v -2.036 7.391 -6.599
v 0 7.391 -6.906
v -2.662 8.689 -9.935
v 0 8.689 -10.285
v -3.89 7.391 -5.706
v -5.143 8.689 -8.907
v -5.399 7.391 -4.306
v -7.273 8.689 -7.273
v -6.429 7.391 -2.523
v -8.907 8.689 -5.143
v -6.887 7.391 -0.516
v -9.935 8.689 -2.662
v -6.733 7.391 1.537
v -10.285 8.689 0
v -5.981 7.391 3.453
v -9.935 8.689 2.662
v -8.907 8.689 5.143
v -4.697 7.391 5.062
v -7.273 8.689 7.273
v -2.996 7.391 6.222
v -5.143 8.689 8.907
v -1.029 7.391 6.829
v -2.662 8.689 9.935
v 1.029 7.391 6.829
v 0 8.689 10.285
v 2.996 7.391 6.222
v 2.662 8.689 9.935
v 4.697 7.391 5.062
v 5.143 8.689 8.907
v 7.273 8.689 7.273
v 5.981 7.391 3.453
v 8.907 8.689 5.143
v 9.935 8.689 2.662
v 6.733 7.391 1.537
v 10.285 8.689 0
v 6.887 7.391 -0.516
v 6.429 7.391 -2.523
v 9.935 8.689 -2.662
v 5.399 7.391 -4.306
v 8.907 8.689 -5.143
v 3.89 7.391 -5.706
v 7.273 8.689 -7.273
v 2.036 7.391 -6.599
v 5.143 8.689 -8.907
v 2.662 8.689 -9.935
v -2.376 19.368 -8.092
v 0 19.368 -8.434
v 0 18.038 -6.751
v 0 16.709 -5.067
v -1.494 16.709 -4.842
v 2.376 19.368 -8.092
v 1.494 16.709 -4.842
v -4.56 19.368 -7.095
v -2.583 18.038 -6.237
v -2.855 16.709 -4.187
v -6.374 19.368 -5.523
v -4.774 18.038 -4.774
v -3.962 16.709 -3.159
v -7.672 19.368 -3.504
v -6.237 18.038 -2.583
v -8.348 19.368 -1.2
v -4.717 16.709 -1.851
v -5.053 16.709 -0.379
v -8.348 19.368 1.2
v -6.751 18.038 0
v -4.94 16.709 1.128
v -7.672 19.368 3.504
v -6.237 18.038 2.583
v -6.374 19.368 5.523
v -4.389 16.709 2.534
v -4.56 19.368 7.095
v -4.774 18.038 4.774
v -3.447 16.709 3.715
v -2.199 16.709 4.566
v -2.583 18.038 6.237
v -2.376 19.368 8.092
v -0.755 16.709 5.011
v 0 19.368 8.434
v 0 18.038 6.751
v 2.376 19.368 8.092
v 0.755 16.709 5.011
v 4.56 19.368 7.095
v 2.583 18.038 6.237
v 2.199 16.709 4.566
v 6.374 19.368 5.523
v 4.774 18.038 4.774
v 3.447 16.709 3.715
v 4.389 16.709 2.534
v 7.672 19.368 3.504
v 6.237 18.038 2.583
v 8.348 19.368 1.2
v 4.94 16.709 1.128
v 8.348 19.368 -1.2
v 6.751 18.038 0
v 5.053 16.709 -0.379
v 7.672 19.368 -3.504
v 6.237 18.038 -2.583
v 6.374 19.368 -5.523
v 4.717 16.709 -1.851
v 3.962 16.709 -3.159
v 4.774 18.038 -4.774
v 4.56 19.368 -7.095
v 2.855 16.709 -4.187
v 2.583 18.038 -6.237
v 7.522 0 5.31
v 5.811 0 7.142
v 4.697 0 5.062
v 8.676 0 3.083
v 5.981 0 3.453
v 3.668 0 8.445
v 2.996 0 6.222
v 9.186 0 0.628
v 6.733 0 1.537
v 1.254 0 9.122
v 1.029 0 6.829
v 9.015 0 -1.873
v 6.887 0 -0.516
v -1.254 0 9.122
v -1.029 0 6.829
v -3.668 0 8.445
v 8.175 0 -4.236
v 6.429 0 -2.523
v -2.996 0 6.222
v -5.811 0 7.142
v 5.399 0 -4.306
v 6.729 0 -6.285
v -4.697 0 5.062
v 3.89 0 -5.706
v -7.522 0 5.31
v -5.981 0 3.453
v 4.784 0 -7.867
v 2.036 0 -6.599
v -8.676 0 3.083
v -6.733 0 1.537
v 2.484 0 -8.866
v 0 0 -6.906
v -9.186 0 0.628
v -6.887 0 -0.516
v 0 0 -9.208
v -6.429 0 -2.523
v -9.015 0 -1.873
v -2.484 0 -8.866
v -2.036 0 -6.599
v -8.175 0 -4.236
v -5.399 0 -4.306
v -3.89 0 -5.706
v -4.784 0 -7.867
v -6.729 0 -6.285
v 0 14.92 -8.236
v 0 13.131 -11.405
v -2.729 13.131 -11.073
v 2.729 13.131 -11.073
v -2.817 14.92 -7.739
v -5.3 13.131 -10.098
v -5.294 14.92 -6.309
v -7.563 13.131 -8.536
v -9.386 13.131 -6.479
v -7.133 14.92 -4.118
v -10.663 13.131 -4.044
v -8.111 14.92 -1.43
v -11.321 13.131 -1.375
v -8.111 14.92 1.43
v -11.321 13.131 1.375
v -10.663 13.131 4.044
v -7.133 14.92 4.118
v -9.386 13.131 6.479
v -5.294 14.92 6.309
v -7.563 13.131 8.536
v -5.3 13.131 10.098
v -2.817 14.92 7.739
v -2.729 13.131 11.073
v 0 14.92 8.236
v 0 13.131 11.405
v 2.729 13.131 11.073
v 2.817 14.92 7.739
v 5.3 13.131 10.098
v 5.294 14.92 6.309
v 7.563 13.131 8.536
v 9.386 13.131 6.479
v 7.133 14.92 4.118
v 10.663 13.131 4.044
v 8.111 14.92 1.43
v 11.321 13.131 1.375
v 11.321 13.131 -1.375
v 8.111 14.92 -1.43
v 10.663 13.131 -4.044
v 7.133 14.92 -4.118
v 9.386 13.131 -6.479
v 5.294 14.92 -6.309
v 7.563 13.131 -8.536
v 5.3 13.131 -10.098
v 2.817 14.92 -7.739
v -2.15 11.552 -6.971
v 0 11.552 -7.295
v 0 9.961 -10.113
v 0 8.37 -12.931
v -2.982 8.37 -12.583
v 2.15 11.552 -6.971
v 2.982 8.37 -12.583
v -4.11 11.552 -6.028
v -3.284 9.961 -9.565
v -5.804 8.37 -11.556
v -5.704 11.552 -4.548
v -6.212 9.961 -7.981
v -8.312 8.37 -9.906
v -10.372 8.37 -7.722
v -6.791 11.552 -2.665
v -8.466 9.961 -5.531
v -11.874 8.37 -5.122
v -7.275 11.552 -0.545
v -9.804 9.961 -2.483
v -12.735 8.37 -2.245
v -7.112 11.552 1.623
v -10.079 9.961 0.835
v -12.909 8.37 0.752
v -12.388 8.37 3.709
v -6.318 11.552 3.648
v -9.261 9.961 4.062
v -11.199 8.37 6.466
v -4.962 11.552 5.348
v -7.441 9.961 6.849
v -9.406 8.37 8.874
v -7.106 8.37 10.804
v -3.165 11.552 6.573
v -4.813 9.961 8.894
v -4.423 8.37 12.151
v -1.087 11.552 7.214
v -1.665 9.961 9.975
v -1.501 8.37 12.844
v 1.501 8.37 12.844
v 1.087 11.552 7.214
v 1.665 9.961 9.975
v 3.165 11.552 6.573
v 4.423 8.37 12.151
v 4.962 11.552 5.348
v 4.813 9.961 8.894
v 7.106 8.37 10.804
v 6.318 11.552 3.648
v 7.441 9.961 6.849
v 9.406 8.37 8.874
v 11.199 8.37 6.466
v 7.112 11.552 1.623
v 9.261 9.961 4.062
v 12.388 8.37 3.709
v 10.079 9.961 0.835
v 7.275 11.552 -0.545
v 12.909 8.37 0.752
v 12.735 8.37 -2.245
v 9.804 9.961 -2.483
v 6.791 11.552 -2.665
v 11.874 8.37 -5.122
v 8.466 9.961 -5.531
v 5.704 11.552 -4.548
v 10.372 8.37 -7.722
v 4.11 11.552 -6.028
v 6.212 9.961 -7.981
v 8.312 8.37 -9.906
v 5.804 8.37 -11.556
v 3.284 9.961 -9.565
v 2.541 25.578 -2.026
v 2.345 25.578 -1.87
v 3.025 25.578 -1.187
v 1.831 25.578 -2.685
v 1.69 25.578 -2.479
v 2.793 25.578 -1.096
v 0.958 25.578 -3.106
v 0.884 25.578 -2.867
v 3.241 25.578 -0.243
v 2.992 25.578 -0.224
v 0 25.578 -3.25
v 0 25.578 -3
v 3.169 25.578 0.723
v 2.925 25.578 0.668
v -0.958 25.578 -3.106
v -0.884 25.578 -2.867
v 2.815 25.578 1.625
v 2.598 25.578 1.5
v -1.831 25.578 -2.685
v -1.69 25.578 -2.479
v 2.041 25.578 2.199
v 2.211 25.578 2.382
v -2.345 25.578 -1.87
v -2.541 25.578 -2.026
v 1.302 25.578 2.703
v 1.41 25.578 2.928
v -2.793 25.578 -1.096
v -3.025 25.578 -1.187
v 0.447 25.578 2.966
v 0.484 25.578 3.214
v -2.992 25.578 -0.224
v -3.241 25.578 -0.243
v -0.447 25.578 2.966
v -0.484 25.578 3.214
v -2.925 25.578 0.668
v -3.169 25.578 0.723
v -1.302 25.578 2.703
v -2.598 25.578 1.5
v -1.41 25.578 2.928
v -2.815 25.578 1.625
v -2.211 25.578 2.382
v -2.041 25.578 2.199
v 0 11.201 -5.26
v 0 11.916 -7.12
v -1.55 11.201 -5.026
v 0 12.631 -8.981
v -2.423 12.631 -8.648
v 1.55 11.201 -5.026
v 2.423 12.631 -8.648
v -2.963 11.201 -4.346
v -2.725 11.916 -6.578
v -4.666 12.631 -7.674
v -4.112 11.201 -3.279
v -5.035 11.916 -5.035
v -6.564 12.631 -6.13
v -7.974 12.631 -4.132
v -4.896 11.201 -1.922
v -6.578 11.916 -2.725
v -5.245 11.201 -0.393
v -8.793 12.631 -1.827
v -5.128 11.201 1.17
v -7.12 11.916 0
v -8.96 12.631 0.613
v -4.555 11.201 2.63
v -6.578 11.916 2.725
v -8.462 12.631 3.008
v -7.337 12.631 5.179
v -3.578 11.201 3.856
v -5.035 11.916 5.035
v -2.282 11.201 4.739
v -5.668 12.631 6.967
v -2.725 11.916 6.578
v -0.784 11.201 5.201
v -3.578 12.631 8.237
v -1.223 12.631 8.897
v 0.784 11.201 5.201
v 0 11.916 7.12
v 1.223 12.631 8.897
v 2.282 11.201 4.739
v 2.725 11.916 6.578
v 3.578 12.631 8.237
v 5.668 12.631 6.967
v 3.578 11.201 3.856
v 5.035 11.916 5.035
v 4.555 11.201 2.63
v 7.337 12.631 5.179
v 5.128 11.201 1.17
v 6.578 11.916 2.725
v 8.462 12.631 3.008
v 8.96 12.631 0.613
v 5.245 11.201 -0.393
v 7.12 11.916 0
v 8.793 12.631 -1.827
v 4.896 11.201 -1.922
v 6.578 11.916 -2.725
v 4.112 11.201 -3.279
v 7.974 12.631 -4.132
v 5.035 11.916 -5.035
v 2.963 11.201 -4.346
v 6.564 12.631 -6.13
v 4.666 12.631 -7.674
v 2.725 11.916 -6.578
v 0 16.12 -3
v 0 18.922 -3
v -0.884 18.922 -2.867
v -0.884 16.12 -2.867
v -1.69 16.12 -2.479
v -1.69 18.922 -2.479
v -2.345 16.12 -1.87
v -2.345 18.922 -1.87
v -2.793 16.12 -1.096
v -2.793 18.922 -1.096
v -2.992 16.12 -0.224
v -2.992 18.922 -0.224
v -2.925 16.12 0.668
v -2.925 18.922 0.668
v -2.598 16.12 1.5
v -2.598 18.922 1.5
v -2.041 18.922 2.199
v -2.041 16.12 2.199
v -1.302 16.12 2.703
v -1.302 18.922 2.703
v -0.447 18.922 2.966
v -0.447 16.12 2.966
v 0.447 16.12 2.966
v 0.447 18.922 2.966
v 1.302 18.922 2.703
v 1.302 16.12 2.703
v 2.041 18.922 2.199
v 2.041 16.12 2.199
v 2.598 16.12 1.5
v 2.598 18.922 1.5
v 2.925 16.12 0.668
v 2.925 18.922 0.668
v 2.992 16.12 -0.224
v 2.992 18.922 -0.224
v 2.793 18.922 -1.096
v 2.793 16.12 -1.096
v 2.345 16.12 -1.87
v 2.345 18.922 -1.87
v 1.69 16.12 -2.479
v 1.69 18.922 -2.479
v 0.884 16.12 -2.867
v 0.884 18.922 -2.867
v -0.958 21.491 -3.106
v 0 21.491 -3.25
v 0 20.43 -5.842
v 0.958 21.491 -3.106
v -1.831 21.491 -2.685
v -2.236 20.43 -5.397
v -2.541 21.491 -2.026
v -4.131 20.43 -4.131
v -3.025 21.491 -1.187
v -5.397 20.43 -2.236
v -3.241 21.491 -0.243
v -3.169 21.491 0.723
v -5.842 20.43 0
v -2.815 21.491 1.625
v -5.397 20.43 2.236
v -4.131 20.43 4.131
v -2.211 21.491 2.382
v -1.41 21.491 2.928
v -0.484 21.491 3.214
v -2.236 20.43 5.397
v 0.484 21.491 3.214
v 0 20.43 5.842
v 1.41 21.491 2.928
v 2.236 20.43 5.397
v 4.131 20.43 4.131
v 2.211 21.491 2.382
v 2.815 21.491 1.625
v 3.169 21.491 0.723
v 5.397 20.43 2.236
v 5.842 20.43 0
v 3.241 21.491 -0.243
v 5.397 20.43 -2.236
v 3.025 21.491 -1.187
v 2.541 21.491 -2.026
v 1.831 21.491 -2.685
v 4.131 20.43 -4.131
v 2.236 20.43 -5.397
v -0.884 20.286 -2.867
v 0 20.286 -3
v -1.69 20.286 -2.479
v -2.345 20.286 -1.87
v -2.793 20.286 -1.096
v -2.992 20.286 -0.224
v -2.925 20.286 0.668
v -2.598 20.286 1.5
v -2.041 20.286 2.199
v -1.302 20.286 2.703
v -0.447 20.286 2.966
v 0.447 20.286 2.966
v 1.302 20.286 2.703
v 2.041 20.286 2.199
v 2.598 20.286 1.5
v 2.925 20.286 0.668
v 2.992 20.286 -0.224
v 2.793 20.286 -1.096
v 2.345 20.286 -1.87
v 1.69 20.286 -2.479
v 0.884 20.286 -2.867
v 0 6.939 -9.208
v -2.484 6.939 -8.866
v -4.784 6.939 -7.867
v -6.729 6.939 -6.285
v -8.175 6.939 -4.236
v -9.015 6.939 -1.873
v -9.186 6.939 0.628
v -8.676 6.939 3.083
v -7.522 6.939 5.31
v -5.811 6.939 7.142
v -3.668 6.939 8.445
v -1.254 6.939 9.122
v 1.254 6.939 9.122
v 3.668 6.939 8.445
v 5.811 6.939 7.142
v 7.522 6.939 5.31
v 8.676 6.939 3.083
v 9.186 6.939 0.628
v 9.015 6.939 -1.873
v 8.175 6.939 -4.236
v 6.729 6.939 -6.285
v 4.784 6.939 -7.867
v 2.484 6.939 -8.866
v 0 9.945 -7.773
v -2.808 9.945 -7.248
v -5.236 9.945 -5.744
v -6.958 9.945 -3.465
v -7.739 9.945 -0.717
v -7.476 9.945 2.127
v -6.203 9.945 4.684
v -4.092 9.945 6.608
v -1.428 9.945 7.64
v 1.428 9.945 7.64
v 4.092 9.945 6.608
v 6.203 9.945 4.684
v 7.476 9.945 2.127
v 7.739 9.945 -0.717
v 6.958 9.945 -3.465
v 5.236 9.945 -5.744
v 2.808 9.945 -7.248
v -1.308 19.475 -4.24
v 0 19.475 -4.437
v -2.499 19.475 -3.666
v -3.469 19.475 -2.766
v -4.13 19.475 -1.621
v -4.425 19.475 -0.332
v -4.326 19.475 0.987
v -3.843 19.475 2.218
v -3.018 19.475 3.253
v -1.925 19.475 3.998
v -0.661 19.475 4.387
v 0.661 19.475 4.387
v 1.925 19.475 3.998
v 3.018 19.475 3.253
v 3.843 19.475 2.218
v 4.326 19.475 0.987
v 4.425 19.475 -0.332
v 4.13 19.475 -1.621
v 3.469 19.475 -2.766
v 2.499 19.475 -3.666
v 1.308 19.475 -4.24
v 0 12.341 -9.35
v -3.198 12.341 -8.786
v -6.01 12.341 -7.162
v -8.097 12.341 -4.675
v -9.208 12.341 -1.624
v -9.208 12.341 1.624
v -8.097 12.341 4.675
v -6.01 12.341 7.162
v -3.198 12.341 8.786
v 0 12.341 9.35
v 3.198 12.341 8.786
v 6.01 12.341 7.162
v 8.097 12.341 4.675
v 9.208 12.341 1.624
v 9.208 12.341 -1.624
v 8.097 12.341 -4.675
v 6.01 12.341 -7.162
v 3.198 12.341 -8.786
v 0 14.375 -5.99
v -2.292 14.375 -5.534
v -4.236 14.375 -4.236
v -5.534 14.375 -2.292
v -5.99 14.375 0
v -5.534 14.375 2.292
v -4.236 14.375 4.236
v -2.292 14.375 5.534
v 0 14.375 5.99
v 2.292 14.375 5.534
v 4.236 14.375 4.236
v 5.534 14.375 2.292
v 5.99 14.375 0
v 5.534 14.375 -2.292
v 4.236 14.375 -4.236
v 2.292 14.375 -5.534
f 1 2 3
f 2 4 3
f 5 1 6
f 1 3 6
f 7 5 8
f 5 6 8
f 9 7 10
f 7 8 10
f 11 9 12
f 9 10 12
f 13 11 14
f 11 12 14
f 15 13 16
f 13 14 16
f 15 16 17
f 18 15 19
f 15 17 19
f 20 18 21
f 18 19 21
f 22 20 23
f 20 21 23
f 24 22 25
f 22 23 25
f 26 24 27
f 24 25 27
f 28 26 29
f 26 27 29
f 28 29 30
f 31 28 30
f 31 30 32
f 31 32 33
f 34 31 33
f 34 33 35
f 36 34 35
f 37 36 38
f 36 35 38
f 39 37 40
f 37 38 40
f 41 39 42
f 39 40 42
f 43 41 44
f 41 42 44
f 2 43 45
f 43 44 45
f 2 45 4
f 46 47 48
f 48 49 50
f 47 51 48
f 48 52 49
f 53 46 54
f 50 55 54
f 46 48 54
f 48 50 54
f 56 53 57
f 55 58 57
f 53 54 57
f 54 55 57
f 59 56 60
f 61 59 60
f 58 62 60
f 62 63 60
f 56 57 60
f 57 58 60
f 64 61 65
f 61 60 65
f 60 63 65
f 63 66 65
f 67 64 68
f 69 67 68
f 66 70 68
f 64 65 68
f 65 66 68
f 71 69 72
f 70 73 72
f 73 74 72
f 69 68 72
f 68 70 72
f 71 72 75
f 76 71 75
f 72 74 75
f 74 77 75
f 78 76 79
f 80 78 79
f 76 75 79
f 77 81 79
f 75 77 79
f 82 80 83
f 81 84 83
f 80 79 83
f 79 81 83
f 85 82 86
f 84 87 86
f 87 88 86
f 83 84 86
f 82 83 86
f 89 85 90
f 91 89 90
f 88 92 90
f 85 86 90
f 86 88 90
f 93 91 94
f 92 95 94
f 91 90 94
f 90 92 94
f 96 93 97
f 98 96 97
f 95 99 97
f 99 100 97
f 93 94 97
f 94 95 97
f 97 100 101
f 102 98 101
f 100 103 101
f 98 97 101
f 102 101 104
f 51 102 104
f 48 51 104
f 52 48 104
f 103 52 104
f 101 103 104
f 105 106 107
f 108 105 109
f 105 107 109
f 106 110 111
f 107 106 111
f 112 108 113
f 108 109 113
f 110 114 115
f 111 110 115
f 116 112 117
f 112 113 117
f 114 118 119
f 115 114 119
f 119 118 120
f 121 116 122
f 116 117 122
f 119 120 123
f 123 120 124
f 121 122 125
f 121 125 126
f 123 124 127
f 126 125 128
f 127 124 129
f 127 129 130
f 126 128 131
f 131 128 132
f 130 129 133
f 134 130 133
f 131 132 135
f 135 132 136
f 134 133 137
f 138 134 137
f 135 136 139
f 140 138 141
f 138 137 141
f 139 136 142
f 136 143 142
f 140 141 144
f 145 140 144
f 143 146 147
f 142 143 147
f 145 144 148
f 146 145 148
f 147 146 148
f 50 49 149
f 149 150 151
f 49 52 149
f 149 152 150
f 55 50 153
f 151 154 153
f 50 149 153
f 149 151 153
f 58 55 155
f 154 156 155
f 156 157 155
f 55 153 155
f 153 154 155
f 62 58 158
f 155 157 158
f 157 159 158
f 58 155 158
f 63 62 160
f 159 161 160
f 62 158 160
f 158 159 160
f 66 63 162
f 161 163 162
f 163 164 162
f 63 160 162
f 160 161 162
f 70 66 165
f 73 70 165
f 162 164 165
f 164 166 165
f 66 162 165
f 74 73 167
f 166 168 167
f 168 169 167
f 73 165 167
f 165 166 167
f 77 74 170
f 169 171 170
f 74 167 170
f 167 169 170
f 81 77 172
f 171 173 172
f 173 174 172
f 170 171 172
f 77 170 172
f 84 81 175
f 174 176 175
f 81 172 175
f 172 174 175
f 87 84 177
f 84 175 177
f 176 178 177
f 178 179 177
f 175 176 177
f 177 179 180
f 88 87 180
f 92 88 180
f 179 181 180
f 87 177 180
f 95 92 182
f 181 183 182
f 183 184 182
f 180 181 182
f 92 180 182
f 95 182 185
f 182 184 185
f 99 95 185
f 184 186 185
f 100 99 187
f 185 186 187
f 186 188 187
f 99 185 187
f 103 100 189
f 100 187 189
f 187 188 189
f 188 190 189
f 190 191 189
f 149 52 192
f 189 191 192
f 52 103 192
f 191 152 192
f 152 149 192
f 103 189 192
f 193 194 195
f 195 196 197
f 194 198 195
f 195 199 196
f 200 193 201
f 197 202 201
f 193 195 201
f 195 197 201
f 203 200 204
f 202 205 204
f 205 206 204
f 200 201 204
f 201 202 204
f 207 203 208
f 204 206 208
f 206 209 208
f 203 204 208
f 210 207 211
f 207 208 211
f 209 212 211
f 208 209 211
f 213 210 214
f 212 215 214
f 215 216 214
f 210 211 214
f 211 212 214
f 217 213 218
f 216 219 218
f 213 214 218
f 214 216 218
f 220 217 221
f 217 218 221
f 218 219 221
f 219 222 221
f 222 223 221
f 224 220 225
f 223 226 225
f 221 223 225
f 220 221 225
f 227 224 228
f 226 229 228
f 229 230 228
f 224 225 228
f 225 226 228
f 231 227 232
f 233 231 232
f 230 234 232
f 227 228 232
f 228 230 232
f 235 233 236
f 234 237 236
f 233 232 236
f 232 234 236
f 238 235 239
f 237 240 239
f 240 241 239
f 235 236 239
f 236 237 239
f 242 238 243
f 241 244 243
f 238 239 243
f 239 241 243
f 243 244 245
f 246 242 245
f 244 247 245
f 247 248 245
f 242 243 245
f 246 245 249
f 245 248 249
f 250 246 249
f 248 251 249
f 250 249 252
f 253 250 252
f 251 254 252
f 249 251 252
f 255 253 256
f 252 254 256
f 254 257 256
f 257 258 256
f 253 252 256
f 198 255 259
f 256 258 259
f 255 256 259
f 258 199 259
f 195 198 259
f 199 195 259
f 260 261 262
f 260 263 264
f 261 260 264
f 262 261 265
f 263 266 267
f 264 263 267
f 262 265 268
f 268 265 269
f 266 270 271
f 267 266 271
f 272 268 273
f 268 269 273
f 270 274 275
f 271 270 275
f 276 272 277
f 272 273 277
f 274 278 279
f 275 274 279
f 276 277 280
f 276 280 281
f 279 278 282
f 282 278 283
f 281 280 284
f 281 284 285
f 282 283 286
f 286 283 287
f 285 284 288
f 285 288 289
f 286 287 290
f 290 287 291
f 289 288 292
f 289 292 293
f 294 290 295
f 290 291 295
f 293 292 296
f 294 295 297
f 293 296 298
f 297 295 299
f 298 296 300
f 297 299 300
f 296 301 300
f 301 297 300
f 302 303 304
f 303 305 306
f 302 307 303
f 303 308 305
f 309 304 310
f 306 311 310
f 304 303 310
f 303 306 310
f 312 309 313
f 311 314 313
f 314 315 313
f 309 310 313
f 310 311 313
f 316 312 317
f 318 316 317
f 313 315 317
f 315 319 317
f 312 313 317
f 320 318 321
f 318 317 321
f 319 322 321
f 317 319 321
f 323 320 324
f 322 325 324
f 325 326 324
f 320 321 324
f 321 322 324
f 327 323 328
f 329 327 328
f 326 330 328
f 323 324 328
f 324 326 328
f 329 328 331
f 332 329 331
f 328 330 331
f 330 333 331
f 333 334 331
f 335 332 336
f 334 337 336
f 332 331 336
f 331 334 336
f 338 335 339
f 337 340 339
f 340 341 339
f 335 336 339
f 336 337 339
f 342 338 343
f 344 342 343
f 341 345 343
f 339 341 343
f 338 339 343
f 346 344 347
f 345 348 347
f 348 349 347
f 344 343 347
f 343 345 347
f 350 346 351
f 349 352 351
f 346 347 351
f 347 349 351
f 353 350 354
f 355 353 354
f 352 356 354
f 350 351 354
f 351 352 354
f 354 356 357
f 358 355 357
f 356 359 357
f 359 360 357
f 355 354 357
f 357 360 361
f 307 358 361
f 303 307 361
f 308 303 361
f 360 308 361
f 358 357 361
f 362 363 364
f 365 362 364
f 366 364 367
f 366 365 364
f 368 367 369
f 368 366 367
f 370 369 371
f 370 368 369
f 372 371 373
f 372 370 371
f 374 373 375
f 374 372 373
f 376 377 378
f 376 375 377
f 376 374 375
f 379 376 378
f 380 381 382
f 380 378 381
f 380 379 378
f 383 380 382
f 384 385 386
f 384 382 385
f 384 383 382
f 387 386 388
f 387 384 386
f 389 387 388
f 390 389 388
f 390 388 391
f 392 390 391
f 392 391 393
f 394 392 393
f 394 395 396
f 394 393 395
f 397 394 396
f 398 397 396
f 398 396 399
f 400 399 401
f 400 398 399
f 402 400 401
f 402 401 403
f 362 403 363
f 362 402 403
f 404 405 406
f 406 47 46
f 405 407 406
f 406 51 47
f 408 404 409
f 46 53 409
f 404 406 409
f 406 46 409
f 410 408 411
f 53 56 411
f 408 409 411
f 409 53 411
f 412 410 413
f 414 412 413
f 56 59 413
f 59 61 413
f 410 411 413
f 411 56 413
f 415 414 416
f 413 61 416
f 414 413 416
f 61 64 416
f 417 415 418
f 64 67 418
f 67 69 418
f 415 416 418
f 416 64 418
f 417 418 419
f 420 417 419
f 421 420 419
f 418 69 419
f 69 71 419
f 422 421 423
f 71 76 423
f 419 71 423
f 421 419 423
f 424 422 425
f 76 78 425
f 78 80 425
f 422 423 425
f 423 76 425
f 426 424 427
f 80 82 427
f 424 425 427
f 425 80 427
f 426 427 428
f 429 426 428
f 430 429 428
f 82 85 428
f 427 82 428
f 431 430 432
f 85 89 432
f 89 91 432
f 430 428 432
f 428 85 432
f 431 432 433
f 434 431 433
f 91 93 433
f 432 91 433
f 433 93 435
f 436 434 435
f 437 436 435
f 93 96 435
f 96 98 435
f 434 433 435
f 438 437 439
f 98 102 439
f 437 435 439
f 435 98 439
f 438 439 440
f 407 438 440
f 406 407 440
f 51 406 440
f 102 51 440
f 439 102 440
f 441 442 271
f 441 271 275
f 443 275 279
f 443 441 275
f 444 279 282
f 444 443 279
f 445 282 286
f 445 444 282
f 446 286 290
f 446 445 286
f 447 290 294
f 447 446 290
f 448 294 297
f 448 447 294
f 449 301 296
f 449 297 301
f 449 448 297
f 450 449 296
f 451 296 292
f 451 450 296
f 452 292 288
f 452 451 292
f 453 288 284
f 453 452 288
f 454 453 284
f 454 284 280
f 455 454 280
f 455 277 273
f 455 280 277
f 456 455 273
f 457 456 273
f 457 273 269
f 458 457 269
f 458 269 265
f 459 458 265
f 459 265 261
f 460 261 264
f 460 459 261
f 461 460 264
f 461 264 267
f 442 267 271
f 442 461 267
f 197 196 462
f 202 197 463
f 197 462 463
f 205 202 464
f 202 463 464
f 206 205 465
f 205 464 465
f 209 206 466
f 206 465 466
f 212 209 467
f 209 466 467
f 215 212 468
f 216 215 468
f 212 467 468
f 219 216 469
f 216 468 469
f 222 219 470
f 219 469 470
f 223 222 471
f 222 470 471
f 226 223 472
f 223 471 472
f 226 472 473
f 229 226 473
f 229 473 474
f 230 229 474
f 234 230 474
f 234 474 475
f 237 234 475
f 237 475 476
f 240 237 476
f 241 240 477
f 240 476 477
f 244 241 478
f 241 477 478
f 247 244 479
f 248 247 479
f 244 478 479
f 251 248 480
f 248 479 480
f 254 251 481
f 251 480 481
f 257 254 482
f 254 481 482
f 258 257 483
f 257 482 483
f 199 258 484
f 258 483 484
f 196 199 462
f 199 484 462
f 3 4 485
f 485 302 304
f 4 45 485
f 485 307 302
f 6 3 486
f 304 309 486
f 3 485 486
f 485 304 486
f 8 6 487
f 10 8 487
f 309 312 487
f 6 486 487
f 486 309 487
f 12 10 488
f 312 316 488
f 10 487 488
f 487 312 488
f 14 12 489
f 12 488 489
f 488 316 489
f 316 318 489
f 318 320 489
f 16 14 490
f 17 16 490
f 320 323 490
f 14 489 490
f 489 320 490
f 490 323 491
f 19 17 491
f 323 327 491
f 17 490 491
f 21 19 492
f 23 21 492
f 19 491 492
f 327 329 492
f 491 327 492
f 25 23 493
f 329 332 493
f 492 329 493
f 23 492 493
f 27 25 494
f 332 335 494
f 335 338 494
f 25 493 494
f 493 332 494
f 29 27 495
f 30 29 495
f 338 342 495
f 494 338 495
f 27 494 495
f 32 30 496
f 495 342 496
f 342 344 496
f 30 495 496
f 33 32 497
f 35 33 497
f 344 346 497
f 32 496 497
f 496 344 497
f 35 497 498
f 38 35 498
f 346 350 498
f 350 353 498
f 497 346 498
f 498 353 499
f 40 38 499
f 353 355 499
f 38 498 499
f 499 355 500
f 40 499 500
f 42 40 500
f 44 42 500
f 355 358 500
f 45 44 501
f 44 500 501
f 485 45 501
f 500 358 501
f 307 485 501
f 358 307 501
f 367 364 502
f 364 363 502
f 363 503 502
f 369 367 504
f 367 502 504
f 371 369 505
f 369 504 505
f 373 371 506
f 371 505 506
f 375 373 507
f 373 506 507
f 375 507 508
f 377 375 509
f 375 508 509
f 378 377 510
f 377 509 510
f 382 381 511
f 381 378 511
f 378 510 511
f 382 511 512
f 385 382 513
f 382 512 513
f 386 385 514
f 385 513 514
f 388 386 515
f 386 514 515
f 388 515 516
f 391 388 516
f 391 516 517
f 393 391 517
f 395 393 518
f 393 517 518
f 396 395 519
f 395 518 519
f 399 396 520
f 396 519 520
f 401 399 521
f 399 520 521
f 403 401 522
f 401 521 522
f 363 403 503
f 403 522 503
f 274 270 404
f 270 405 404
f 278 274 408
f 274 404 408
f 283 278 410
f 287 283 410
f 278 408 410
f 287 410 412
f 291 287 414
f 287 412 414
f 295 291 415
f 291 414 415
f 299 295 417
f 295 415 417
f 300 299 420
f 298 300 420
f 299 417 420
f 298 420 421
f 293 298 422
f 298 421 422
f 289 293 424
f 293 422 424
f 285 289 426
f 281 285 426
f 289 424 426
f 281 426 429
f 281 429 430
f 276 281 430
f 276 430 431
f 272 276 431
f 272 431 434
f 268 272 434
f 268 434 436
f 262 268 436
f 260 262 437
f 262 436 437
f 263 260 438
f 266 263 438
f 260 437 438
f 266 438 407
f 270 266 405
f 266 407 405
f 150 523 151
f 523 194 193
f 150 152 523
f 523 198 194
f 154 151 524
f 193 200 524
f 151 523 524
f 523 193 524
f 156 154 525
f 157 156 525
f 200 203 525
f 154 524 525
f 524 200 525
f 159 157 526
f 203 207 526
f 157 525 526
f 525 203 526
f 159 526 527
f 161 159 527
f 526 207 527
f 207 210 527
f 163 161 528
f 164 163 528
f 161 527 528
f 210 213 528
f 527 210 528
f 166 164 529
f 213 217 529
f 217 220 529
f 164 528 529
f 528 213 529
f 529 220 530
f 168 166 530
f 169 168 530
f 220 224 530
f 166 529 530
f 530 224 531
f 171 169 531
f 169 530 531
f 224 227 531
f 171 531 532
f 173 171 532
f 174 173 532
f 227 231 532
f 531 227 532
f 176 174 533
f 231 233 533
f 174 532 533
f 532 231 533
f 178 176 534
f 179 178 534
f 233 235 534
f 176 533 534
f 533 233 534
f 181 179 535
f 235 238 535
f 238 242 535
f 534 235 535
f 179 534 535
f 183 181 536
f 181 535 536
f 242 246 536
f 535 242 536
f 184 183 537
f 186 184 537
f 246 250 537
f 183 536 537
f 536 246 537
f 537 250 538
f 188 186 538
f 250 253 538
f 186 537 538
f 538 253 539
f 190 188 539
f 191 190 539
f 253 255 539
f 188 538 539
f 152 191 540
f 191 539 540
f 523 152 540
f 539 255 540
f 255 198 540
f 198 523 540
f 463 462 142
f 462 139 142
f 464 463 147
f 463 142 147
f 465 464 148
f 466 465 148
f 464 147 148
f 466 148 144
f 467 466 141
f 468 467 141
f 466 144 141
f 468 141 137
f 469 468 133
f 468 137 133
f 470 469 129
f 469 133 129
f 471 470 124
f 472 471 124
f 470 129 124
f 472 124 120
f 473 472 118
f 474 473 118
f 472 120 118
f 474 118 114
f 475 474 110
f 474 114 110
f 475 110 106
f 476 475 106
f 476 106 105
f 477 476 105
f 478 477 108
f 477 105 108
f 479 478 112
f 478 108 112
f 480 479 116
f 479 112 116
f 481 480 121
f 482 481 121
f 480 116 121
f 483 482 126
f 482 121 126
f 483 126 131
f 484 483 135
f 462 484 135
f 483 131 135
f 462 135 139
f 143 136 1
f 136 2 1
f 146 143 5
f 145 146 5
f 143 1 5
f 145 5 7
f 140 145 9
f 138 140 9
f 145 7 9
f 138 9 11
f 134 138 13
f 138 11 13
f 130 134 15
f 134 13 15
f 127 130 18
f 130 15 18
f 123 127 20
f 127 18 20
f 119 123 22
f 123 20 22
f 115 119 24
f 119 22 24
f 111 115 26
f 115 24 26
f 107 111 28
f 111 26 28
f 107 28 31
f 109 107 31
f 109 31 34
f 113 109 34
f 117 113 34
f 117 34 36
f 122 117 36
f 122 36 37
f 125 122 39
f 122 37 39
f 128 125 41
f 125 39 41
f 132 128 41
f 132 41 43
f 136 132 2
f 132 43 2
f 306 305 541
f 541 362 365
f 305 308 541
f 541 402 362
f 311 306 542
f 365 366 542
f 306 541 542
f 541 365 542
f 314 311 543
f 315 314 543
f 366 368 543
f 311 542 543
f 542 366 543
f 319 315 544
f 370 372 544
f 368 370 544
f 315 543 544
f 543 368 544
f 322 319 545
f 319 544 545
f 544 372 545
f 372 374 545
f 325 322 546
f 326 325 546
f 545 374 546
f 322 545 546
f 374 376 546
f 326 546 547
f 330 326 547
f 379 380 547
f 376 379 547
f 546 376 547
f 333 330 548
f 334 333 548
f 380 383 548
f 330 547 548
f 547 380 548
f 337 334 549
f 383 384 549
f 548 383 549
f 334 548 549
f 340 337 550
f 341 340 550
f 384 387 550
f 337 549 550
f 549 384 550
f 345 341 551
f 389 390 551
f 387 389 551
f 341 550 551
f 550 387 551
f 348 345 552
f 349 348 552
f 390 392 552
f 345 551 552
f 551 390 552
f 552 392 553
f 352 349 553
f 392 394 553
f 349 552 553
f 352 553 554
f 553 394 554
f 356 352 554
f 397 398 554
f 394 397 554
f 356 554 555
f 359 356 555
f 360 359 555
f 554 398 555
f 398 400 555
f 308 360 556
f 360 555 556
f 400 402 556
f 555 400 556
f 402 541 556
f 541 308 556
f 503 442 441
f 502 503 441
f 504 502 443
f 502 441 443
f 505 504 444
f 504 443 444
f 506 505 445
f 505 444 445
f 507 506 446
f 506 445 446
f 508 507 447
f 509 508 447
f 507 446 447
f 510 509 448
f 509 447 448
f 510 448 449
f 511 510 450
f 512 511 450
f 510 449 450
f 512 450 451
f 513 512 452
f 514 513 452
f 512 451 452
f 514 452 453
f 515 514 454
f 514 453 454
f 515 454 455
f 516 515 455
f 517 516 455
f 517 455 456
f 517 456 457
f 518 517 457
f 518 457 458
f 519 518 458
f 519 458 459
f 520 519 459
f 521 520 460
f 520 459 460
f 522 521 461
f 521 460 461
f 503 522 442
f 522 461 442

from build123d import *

# Parameters (mm, degrees)
CUT_EXTRUDE1_DEPTH      = 32.44305901
CUT_EXTRUDE1_DEPTH_BACK = 32.44305901
SKETCH2_R               = 3


with BuildPart() as part:
    # Sketch1 → Revolve1 (revolve)
    with BuildSketch(Plane.XY, mode=Mode.PRIVATE) as revolve1_sk:
        Polygon((-9.2075, 6.93899031), (-9.2075, 5.967196114), (-9.2075, 0), (-6.905893187, 0), (-6.905893187, 6.416213171), (-6.905893187, 7.390660798), (-10.285280241, 8.689390938), (-5.259867997, 11.200858424), (-8.980968211, 12.630912137), (-2.983991931, 16.129225704), (-2.983991931, 18.916244006), (-4.436960556, 19.474633476), (0, 21.979471408), (0, 25.578013153), (-3.25, 25.578013153), (-3.25, 21.491279951), (-8.434096868, 19.368086458), (-5.067424881, 16.708608808), (-11.404533468, 13.131062925), (-7.295164247, 11.551793791), (-12.931187167, 8.370038214), align=None)
    revolve(revolve1_sk.sketch.rotate(Axis((0, -7.059352361, 0), (0, 1, 0)), 270), axis=Axis((0, -7.059352361, 0), (0, 1, 0)))

    # Sketch2 → Cut-Extrude1 (cut, two sides: drawn at the far end of the back side and taken through both)
    with BuildSketch(Plane(origin=(0, 25.578013153, 0), x_dir=(1, 0, 0), z_dir=(0, 1, 0)).offset(-CUT_EXTRUDE1_DEPTH_BACK)):
        with Locations(Location((0, 0, 0), (0, 0, 90))):
            Circle(SKETCH2_R)
    extrude(amount=CUT_EXTRUDE1_DEPTH + CUT_EXTRUDE1_DEPTH_BACK, mode=Mode.SUBTRACT)


solid = part.part
